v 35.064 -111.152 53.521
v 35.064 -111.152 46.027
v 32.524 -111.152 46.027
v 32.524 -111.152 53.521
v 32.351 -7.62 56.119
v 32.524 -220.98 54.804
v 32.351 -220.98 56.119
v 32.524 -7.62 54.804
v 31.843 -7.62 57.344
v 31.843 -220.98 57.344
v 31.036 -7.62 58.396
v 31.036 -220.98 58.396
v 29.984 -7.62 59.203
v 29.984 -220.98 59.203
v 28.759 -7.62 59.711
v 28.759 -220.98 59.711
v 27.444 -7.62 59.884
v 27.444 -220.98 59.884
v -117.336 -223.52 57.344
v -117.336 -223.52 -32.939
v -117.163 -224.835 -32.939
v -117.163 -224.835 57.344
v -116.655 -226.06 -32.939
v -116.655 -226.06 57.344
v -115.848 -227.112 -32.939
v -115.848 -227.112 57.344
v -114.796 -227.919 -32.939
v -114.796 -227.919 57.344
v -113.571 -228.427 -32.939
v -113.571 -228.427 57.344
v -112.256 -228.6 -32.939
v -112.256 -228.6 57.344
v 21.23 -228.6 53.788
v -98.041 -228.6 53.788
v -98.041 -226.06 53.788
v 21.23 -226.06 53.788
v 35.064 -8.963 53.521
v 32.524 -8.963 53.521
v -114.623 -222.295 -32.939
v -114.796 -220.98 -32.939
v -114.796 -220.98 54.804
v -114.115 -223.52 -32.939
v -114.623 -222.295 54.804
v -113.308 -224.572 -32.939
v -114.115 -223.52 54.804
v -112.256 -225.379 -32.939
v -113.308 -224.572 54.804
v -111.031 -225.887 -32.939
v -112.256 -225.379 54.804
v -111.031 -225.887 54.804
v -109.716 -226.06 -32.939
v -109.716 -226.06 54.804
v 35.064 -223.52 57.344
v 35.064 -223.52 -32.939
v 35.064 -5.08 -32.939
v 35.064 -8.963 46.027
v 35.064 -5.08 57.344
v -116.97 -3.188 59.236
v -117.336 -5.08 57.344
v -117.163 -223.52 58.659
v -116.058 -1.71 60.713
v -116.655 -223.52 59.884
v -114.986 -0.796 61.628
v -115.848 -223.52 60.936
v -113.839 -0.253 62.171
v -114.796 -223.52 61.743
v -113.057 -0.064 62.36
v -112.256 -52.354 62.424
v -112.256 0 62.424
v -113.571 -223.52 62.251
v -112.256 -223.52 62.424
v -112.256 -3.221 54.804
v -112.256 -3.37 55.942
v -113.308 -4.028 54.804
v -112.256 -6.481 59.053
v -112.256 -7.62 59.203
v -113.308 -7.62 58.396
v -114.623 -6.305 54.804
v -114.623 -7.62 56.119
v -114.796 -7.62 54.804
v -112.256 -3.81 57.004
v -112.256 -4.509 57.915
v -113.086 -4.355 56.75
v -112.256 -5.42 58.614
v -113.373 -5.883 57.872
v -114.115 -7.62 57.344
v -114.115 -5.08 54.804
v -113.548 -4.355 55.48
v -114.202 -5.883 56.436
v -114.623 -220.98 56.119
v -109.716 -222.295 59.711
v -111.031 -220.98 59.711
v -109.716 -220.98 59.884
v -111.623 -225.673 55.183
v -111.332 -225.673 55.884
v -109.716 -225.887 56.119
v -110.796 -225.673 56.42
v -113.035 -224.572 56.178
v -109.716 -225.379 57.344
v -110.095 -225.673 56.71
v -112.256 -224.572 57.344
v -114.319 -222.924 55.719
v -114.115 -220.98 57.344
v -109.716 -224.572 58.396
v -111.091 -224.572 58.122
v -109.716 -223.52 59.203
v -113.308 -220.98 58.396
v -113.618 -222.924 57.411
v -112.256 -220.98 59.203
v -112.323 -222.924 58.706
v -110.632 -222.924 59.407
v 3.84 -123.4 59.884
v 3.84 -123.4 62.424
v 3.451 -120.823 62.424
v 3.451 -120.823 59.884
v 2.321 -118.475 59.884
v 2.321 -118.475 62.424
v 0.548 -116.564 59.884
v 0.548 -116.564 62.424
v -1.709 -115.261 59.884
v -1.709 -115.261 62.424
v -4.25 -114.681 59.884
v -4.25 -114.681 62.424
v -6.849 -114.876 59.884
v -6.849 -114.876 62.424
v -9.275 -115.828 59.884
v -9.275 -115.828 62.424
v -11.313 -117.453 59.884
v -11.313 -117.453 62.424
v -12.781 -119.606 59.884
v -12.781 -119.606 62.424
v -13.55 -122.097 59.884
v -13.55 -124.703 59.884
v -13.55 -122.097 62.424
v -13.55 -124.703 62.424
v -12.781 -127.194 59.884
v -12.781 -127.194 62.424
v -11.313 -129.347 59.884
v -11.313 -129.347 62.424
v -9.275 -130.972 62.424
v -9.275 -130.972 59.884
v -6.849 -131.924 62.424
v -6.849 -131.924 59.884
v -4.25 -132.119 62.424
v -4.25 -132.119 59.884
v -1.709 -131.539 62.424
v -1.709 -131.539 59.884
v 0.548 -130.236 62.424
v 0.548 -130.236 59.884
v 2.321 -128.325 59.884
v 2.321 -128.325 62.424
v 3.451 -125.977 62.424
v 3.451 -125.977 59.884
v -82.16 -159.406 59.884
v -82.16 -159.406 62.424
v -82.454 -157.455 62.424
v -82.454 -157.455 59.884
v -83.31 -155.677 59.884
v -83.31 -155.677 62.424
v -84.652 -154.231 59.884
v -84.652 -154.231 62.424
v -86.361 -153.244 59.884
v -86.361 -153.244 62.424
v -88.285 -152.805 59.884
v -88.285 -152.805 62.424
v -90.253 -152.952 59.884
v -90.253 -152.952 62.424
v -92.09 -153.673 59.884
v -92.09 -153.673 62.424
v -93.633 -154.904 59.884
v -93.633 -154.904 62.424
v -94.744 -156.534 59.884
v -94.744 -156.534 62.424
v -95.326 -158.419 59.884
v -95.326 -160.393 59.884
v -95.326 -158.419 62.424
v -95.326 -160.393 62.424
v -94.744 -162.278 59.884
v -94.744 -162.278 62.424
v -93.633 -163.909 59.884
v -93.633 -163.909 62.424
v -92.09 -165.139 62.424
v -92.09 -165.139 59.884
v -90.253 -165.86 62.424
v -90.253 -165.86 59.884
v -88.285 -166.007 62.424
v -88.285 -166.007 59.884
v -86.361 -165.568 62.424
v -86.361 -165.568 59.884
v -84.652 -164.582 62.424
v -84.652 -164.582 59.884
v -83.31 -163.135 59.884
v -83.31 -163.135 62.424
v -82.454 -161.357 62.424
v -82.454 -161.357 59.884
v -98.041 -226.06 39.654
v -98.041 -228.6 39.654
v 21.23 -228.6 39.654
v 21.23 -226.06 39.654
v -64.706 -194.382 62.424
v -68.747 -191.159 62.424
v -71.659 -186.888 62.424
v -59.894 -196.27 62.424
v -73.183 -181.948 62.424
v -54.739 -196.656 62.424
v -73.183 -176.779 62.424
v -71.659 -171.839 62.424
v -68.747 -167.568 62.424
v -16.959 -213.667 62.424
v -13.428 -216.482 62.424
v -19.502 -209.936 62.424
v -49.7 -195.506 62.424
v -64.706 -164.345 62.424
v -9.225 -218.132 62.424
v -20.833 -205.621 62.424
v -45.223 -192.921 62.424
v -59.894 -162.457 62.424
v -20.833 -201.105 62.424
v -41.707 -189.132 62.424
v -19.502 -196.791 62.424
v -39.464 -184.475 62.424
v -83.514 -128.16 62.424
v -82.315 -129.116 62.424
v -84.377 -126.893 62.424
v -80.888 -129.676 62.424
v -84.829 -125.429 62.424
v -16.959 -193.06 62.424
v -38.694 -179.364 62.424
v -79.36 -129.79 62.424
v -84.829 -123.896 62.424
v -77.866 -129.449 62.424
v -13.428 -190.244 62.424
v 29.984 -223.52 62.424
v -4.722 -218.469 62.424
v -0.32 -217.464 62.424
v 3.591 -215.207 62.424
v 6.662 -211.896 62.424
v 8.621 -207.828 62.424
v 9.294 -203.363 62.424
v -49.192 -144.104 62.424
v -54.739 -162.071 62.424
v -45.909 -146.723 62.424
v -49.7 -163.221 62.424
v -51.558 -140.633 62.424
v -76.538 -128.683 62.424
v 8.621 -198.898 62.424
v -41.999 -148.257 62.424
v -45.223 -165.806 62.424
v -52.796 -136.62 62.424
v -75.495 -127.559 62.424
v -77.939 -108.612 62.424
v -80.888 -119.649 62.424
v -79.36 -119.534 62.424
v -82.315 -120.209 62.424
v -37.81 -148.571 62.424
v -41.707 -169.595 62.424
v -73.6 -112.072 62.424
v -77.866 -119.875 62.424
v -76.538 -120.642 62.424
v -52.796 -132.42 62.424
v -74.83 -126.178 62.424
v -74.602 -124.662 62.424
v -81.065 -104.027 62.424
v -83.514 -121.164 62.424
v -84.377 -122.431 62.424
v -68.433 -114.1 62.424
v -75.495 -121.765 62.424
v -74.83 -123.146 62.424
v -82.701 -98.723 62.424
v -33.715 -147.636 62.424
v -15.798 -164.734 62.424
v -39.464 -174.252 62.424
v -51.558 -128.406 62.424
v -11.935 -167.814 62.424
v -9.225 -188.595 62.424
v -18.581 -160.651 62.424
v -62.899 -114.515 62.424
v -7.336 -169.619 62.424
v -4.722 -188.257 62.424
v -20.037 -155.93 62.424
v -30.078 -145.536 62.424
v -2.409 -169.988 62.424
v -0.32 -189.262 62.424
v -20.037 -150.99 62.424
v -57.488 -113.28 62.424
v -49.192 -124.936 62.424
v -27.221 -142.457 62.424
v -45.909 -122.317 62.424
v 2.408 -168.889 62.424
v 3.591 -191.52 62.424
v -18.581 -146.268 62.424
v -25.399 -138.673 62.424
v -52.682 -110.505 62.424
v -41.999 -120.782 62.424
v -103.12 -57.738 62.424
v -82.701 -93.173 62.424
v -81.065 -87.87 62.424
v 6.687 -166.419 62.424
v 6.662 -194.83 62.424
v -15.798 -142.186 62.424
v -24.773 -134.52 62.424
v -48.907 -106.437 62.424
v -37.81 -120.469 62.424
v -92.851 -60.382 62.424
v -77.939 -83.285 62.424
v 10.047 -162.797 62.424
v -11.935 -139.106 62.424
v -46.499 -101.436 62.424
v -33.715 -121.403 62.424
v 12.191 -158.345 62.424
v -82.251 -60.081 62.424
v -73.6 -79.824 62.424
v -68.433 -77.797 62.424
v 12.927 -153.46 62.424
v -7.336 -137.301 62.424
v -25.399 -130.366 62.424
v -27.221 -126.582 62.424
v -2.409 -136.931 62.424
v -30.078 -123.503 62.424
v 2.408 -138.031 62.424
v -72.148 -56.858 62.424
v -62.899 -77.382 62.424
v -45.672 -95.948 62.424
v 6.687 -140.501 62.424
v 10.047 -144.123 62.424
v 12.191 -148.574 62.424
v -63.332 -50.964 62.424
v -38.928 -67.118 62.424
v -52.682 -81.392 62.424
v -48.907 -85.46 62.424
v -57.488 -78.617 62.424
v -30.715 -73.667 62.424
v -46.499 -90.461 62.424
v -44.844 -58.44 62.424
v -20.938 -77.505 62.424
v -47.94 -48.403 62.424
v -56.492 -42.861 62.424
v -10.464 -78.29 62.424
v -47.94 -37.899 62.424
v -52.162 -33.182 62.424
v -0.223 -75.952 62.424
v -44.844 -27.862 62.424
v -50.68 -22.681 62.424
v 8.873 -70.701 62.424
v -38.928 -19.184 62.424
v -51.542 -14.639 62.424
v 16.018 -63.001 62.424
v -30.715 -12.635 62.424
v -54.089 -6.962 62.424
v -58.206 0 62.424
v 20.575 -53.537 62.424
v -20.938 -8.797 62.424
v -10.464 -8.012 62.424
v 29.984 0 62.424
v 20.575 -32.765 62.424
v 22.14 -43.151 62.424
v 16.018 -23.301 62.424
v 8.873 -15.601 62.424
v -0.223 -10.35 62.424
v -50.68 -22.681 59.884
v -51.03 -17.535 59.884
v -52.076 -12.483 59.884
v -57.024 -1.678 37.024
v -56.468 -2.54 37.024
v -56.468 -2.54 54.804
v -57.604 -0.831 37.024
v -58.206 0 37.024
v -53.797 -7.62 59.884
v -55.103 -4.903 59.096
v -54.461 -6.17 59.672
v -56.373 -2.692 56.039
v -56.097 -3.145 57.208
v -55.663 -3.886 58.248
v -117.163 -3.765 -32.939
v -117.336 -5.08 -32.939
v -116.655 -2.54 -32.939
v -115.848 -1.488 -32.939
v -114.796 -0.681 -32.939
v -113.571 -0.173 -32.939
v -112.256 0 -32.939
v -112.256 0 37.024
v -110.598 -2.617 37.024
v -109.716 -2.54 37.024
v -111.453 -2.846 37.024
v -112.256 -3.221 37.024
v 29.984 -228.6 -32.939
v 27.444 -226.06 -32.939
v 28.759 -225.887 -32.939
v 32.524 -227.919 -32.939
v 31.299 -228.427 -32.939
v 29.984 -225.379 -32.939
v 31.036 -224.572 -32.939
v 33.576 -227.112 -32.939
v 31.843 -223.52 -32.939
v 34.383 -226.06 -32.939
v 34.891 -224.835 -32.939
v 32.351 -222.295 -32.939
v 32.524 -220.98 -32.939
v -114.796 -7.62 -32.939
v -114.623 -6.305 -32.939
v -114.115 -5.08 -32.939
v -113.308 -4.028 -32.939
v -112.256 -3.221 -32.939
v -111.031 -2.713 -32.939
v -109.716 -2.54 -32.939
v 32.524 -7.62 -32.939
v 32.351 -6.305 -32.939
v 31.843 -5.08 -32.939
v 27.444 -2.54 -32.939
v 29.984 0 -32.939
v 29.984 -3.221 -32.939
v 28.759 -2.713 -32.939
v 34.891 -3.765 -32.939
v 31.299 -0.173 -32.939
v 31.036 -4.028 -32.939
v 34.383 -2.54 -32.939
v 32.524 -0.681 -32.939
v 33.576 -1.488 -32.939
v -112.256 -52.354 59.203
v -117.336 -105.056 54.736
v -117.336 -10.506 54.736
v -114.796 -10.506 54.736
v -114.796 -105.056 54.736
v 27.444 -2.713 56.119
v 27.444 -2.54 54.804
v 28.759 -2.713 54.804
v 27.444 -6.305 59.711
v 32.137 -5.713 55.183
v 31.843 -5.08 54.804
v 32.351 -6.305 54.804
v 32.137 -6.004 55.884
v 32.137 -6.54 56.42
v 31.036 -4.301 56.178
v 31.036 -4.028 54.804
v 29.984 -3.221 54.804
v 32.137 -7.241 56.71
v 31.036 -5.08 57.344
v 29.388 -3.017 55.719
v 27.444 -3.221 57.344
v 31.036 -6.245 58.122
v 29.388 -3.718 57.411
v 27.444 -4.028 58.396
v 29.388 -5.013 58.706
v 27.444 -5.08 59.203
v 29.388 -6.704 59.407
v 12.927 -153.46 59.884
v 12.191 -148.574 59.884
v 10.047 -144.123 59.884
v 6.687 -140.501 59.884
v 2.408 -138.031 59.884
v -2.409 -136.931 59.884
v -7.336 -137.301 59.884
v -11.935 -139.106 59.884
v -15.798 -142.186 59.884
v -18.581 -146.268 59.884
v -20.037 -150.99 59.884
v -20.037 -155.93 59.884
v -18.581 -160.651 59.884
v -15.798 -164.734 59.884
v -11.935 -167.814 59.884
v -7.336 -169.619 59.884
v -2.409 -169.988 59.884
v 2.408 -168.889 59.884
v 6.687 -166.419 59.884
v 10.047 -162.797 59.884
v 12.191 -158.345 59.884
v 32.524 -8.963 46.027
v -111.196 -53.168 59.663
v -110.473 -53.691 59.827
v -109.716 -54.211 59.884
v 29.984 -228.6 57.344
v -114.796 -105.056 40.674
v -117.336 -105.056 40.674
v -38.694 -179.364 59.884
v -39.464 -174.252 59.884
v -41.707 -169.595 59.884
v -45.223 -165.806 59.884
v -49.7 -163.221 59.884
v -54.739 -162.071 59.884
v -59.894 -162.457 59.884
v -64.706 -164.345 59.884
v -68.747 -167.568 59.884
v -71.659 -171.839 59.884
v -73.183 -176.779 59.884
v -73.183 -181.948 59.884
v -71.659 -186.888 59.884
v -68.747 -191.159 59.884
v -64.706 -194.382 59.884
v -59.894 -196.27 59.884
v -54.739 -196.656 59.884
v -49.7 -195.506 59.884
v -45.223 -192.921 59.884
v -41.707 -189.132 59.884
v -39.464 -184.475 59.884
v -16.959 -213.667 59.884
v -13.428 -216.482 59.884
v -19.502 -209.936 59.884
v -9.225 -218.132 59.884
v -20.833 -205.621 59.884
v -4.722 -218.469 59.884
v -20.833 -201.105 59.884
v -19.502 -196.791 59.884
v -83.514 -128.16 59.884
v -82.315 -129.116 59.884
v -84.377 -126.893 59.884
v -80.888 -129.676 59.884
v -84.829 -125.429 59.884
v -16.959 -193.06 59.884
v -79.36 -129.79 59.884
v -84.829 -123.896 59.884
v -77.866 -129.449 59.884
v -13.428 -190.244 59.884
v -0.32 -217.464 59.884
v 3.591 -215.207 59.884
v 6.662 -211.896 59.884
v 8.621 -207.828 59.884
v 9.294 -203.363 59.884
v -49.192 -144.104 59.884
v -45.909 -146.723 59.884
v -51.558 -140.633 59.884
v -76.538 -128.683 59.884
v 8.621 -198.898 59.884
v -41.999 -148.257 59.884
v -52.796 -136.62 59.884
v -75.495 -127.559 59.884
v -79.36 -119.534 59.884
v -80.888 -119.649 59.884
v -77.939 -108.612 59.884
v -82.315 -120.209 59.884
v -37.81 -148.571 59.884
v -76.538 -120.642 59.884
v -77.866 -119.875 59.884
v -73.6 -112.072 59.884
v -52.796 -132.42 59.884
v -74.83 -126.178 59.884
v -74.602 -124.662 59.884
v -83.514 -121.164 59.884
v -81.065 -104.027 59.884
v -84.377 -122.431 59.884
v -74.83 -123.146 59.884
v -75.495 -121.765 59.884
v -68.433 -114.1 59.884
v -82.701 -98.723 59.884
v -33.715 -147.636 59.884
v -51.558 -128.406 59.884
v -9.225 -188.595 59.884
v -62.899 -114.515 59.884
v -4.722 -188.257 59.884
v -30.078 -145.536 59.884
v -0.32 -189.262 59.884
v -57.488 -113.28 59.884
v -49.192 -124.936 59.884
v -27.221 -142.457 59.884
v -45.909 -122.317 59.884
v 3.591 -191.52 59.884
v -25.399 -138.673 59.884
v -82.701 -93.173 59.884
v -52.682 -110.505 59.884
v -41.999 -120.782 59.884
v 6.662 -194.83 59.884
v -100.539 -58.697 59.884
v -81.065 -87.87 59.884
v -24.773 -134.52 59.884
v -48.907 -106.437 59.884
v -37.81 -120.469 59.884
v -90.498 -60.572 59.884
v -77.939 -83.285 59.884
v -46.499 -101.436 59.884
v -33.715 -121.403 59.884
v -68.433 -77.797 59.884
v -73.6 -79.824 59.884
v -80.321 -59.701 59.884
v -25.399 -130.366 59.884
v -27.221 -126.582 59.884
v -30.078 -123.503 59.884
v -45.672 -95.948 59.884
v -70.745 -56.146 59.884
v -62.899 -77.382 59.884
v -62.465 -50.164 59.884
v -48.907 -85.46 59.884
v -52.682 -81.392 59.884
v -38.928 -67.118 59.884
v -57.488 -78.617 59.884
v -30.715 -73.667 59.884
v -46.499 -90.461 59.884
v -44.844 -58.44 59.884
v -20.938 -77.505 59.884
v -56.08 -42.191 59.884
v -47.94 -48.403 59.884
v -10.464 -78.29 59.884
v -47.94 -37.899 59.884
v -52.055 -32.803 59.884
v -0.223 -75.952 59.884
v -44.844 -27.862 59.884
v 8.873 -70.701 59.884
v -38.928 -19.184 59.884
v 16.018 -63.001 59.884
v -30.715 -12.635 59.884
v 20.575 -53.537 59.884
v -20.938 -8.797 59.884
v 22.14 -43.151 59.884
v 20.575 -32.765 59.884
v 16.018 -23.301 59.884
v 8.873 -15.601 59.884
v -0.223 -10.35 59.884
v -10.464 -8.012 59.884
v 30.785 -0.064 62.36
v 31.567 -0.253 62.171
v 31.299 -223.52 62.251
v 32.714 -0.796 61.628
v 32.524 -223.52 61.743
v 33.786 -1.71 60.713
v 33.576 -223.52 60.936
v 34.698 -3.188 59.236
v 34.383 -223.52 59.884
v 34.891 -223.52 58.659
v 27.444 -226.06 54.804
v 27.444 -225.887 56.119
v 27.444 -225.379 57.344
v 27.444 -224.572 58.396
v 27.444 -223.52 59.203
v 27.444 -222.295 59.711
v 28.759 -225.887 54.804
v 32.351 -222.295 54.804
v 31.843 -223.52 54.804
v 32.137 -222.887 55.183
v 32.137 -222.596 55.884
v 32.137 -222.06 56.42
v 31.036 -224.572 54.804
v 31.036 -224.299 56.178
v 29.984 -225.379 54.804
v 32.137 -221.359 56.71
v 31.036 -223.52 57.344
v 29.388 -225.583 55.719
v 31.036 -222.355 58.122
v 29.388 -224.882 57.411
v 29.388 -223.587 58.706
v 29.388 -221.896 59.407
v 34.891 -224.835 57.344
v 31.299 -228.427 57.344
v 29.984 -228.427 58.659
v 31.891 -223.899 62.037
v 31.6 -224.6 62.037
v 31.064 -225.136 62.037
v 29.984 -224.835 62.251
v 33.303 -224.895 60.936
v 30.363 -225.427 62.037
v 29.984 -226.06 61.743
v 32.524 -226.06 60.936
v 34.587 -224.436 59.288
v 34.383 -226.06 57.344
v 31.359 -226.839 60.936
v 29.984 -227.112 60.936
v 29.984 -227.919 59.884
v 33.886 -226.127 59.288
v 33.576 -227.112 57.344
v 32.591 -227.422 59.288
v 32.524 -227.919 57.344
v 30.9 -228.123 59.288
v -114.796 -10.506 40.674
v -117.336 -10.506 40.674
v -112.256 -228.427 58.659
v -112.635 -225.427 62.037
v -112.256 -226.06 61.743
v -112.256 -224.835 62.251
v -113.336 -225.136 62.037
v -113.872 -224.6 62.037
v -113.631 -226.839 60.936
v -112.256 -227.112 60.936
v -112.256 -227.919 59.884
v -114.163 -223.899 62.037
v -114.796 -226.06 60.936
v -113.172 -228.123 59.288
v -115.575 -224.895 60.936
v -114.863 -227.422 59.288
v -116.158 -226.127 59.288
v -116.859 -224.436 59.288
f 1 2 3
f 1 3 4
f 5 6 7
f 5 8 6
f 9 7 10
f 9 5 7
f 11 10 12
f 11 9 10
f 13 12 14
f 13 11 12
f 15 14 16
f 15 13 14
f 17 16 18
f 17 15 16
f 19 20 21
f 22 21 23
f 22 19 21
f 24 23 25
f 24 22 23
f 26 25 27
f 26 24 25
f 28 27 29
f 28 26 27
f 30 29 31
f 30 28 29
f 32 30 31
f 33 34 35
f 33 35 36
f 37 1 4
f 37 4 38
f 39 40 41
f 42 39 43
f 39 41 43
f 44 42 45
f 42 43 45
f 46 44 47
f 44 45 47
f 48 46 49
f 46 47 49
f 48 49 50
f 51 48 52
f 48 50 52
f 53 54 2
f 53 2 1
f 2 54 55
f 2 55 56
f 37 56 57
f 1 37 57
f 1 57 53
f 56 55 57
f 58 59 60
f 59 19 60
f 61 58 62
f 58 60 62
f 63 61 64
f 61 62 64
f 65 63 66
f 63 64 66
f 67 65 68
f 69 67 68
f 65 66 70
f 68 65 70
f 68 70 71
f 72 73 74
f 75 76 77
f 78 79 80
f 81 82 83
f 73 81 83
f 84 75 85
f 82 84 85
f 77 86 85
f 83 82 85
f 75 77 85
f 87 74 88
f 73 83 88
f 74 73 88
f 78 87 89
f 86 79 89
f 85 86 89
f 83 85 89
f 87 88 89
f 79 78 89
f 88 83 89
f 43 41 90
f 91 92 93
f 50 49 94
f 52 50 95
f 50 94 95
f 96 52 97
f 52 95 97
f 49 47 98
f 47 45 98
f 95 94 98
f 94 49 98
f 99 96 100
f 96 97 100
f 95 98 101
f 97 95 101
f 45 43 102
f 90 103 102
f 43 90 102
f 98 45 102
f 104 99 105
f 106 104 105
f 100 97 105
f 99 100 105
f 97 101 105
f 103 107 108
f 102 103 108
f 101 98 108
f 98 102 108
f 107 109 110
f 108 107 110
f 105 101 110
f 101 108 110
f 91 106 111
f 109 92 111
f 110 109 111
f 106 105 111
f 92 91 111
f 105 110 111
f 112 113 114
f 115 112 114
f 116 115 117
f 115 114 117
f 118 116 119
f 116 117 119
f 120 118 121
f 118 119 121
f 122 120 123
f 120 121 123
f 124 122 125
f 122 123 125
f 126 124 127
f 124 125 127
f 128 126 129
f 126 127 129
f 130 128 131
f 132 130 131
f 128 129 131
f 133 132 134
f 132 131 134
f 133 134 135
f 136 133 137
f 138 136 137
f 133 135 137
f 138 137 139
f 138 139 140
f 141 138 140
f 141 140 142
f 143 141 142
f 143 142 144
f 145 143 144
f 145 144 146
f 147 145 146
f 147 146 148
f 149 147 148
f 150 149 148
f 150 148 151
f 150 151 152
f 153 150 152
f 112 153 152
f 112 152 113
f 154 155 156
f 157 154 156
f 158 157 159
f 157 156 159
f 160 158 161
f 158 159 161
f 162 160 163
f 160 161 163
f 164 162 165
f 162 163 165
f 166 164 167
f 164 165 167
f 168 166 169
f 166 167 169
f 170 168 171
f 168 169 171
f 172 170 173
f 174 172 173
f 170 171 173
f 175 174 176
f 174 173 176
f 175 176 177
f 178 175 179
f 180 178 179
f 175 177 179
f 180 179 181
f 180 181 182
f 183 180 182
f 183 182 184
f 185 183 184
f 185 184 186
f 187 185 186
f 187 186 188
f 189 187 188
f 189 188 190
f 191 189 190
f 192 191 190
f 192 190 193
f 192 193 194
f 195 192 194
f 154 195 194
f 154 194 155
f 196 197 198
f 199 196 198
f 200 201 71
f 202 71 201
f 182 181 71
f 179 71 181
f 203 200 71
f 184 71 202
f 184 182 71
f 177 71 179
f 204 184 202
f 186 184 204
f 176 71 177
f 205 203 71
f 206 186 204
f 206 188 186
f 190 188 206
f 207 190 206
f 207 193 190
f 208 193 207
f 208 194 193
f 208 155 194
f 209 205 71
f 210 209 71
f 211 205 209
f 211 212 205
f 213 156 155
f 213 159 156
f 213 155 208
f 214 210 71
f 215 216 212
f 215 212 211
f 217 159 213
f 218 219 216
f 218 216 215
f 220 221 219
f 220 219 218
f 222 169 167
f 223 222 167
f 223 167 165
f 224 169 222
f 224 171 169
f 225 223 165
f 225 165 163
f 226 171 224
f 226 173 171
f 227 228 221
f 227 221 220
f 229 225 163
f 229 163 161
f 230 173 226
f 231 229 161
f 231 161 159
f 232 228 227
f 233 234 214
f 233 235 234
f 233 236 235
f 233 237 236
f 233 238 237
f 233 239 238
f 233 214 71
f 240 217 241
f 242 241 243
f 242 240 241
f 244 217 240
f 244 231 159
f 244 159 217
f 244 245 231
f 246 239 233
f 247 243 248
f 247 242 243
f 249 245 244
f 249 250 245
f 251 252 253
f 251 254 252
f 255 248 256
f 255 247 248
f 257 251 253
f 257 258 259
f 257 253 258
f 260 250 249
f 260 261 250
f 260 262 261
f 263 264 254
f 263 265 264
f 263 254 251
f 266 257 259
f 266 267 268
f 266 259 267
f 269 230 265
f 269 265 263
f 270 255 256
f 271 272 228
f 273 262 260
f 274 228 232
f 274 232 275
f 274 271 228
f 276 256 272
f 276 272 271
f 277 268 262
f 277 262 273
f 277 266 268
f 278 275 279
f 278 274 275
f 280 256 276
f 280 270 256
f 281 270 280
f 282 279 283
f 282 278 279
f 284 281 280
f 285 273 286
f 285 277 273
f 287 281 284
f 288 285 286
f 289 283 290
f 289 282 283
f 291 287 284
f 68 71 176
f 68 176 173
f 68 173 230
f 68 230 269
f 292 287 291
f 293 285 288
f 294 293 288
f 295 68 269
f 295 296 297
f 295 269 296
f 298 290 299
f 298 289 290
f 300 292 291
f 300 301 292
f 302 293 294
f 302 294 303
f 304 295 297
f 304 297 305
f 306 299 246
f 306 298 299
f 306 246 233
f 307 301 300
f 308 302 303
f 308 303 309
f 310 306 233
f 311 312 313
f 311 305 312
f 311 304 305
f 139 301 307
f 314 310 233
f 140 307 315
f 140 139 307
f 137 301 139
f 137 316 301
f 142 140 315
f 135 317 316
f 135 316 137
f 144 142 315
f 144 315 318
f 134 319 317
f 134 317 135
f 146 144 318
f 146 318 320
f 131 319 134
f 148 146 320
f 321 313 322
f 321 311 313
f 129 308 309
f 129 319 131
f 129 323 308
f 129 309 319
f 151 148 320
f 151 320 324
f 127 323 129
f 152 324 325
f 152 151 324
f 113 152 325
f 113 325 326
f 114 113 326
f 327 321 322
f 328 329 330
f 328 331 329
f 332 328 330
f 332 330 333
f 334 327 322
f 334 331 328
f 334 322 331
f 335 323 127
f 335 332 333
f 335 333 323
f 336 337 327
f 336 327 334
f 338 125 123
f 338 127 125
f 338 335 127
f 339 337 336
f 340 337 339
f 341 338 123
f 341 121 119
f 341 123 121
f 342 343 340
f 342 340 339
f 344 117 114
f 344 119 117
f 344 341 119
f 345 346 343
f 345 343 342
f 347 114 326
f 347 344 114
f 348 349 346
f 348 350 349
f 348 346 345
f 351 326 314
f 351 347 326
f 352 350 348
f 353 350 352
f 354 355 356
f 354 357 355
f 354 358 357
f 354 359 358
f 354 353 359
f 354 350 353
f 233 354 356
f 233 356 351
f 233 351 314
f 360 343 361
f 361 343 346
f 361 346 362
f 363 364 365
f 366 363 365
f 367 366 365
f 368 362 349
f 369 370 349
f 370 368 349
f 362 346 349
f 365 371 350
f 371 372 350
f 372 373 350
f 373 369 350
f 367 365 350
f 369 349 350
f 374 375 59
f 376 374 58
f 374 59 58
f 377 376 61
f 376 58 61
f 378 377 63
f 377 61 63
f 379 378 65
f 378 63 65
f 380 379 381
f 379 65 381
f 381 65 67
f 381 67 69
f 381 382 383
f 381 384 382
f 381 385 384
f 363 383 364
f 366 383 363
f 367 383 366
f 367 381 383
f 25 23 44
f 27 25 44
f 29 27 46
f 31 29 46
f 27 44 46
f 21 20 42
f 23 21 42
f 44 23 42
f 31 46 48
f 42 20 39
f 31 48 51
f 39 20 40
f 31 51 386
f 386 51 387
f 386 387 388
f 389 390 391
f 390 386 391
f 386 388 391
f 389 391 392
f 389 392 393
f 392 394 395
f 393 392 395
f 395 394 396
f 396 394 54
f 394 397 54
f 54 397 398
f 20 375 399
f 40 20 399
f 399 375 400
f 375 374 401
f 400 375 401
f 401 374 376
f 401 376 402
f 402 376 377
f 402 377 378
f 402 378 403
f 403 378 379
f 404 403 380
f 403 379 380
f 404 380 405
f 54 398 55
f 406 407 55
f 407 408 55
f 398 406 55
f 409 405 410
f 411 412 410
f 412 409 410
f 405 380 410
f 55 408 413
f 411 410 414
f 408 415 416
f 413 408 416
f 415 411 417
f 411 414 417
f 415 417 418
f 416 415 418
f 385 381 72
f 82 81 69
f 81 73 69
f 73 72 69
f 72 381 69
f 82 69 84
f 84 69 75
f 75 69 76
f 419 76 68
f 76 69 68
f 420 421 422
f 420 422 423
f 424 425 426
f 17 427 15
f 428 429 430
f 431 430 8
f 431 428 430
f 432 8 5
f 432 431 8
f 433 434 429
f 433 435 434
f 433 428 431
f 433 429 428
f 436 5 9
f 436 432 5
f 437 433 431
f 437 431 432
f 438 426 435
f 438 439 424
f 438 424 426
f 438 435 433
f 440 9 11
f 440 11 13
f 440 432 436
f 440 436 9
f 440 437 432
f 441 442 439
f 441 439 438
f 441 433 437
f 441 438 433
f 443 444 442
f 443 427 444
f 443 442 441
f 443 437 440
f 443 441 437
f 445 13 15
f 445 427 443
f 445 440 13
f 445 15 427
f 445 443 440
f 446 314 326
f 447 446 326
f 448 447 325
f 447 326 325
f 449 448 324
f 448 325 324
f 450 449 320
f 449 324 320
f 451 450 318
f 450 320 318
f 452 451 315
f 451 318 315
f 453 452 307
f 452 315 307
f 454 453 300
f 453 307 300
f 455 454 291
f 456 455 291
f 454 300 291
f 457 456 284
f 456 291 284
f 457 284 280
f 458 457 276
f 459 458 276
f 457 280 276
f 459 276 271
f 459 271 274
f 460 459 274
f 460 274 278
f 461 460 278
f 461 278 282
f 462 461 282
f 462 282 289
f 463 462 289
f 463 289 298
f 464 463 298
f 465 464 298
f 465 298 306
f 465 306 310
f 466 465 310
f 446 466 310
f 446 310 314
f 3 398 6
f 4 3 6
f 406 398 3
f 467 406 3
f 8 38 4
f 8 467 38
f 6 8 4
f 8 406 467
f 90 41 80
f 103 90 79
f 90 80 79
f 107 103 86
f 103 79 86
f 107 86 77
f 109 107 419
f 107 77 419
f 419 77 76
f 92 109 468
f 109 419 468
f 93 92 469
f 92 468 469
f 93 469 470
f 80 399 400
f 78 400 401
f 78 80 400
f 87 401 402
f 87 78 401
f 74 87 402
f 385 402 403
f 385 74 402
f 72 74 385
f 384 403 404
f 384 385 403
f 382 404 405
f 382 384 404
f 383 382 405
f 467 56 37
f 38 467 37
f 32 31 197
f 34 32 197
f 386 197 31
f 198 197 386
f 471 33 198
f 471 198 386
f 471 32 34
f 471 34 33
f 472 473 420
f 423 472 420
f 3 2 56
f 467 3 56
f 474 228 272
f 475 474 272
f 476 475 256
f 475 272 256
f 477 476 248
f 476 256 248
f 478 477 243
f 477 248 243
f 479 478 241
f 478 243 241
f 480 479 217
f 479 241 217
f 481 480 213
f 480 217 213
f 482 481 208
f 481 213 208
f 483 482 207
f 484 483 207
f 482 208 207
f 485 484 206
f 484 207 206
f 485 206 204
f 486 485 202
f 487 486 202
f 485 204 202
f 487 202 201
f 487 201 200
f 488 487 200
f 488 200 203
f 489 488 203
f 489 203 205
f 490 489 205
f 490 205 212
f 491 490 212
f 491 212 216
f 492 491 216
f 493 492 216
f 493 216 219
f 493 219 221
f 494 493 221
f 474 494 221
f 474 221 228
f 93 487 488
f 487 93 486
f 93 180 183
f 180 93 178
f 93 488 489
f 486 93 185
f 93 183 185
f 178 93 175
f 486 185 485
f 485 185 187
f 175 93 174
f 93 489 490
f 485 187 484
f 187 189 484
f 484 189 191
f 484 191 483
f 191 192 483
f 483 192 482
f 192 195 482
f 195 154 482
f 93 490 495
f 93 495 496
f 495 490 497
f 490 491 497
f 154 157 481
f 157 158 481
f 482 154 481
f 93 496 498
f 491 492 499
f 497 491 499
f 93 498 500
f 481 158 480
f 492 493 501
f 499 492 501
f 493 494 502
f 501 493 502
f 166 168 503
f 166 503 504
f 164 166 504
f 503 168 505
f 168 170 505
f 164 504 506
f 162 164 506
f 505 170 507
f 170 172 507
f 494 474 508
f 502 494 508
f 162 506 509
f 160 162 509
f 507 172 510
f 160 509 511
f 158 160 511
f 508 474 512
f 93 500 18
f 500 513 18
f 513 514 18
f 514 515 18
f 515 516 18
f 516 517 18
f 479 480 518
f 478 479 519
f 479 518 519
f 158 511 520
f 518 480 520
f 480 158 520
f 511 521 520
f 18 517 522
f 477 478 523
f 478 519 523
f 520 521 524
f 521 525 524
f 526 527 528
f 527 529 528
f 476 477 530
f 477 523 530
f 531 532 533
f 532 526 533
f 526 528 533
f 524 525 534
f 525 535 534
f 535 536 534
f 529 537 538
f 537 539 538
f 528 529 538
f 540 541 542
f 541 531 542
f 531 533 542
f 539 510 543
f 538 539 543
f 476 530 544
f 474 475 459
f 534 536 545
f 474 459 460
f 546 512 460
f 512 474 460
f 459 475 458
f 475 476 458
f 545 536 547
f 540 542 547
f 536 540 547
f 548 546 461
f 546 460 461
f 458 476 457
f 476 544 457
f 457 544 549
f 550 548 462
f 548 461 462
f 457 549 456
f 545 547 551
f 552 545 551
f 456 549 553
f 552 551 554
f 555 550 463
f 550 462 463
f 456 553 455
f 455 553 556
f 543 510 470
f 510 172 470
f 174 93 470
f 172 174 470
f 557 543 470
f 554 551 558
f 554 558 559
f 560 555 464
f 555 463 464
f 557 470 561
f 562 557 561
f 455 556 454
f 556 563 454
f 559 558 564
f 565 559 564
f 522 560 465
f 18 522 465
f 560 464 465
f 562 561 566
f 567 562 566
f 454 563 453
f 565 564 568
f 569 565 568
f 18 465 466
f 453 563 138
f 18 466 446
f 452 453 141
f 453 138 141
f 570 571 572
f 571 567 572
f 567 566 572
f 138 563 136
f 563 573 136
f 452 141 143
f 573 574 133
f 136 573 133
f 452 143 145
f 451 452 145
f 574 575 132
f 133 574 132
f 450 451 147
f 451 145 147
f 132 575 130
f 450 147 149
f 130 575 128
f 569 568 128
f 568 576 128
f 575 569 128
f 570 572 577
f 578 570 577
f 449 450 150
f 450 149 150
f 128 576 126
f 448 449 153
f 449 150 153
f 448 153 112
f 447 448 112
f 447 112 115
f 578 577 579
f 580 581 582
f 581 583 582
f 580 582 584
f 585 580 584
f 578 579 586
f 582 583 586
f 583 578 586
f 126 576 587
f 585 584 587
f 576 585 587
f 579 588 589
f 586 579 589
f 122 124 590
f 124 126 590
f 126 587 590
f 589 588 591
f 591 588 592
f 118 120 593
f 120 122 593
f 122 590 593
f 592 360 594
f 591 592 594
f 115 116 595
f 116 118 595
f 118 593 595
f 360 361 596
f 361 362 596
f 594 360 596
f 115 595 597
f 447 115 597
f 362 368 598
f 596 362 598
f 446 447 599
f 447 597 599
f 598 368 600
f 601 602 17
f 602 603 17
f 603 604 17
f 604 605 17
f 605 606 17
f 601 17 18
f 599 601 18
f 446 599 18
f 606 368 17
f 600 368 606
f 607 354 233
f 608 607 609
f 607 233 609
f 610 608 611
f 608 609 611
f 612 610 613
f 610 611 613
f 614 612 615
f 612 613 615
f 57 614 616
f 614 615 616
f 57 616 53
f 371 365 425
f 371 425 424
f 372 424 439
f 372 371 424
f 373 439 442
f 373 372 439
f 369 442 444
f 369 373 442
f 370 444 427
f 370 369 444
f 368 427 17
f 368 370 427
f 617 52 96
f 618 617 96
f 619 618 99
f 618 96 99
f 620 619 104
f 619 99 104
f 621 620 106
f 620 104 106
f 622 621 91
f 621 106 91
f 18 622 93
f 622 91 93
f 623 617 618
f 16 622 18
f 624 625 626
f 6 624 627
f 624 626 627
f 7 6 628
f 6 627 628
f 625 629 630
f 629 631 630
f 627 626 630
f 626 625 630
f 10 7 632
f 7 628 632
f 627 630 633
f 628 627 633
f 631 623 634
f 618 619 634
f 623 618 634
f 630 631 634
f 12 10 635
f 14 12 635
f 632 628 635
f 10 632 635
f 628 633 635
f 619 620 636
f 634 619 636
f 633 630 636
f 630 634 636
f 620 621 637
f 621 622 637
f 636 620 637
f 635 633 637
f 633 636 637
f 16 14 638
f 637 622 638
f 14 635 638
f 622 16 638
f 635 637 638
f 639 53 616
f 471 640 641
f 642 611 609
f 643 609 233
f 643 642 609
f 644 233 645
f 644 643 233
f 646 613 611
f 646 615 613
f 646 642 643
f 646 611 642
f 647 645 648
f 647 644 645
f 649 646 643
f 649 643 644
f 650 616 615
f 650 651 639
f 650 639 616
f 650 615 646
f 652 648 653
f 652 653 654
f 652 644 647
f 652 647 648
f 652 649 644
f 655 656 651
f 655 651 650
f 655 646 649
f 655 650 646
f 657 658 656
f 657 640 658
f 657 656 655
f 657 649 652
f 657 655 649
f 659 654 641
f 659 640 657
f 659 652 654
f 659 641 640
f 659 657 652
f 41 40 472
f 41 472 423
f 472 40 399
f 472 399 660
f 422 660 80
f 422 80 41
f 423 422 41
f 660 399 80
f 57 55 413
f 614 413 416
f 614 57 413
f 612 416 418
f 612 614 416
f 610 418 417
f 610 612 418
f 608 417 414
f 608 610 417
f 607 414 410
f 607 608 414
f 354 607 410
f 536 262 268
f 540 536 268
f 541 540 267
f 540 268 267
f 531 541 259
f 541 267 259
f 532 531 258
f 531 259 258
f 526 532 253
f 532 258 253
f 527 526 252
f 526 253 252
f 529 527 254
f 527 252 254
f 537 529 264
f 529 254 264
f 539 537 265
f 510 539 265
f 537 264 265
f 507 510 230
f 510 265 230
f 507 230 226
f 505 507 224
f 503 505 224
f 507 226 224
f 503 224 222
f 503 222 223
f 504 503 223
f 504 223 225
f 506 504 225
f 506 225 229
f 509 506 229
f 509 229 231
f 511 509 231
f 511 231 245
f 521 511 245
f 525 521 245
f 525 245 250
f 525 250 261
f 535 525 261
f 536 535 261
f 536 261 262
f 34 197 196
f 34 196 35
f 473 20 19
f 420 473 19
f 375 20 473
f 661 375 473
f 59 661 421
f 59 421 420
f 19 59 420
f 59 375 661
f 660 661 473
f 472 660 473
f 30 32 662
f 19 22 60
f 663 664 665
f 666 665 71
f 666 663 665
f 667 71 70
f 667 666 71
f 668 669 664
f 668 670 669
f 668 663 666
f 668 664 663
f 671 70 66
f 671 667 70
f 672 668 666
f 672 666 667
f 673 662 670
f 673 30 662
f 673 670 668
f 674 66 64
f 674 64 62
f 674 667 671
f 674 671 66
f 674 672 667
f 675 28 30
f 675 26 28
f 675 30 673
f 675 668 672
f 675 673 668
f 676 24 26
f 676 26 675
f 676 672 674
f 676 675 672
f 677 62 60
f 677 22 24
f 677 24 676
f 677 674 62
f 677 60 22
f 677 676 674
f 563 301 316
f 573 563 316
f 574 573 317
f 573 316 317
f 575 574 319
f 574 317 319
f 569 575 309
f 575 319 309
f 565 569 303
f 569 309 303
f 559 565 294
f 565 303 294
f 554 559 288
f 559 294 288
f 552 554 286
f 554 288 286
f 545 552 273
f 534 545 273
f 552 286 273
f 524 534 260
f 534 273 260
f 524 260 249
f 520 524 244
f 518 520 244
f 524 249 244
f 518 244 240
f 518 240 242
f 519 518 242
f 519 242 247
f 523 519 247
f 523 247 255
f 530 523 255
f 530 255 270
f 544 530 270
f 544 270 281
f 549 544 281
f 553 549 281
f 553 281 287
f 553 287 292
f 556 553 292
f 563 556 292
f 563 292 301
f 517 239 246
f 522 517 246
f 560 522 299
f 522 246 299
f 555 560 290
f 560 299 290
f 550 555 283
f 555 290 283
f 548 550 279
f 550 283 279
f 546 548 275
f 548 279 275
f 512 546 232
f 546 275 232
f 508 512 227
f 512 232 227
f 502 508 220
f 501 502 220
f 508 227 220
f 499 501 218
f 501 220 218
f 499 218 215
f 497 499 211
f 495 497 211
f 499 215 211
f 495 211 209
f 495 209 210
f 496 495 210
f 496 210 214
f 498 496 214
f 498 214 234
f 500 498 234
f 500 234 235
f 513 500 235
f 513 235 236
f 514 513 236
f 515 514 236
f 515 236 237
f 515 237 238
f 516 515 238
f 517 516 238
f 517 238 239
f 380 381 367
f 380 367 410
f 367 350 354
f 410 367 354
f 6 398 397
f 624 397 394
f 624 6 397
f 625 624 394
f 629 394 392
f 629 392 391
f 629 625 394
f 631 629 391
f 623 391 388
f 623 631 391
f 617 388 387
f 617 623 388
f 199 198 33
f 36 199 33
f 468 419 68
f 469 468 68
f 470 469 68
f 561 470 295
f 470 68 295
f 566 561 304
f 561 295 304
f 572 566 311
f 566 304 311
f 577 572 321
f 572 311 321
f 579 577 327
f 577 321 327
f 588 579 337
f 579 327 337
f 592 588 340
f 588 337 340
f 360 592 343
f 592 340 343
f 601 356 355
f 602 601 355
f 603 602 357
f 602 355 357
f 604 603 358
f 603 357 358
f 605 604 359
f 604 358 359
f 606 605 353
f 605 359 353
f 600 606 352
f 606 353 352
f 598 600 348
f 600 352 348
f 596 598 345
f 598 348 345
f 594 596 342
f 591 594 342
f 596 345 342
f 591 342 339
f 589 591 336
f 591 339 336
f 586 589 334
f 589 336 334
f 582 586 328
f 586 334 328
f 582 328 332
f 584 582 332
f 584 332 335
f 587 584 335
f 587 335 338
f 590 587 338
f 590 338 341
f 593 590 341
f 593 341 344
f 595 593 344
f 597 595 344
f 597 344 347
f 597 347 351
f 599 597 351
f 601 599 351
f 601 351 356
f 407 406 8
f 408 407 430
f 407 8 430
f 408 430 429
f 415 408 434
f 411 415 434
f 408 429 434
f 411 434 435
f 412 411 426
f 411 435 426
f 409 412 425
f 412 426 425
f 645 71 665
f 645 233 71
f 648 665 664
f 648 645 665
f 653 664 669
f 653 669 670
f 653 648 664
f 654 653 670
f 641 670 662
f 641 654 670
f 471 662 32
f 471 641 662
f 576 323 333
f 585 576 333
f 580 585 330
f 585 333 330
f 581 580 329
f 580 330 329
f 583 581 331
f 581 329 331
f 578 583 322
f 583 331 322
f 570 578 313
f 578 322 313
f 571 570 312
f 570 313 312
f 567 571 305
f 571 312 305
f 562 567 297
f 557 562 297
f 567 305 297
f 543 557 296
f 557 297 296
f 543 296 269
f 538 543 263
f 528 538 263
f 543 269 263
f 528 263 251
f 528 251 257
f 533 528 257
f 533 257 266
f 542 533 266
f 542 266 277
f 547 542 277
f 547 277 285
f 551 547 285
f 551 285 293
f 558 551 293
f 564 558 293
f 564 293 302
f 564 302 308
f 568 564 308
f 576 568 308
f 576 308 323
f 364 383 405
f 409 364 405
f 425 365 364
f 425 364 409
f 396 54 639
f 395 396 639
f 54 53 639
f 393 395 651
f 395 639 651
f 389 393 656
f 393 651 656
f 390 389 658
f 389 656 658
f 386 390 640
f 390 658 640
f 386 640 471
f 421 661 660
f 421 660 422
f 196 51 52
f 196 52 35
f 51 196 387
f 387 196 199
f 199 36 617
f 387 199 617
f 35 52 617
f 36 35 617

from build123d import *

# Parameters (mm, degrees)
F0_W      = 152.4
F0_H      = 95.3626578227
F1_DEPTH  = 228.6
F2_T      = -2.54
F3_R      = 5.08
F4_R      = 35.2372499074
F5_DEPTH  = 25.4
F6_R      = 18.618406975
F6_R_2    = 16.5748786225
F6_R_3    = 8.7435651561
F6_R_4    = 17.3413047292
F7_DEPTH  = 25.4
F8_R      = 5.1423481667
F8_R_2    = 14.090646871
F8_R_3    = 6.6197884321
F8_R_4    = 15.148279019
F9_DEPTH  = 25.4
F10_W     = 119.2719545215
F10_H     = 14.1333565116
F11_DEPTH = 25.4
F12_W     = 94.5496149361
F12_H     = 14.0616036952
F13_DEPTH = 25.4
F14_W     = 102.1888470277
F14_H     = 7.4939653277
F15_DEPTH = 25.4


with BuildPart() as f1:
    # F0 (on Front) → F1 (new body)
    with BuildSketch(Plane.XZ):
        with Locations((-41.1360282451, 14.7424824536)):
            Rectangle(F0_W, F0_H)
    extrude(amount=F1_DEPTH)

    # F2
    f2_openings = [f1.faces().sort_by_distance(p)[0] for p in [
        (-41.136028, -114.3, -32.938846),
    ]]
    offset(amount=F2_T, openings=f2_openings)

    # F3
    f3_edges = [f1.edges().sort_by_distance(p)[0] for p in [
        (-114.796028, -114.3, 59.883811),
        (-114.796028, -226.06, 13.472482),
        (-41.136028, -226.06, 59.883811),
        (32.523972, -226.06, 13.472482),
        (-41.136028, -2.54, 59.883811),
        (-114.796028, -2.54, 13.472482),
        (35.063972, 0, 14.742482),
        (-117.336028, 0, 14.742482),
        (-117.336028, -228.6, 14.742482),
        (35.063972, -228.6, 14.742482),
        (32.523972, -2.54, 13.472482),
        (35.063972, -114.3, 62.423811),
        (-41.136028, -228.6, 62.423811),
        (-117.336028, -114.3, 62.423811),
        (32.523972, -114.3, 59.883811),
    ]]
    fillet(f3_edges, radius=F3_R)

    # F4 (on face) → F5 (cut)
    with BuildSketch(Plane.XY.offset(62.423811365)):
        with Locations((-13.0968187004, -43.1509837508)):
            Circle(F4_R)
    extrude(amount=-F5_DEPTH, mode=Mode.SUBTRACT)

    # F6 (on face) → F7 (cut)
    with BuildSketch(Plane.XY.offset(62.423811365)):
        with BuildLine():
            ThreePointArc((-112.2560282451, -52.3542664582), (-72.1481054557, -56.8578320674), (-50.6796549672, -22.681331262))
            ThreePointArc((-50.6796549672, -22.681331262), (-52.6104743381, -10.7325381795), (-58.2063964066, 0))
            Line((-58.2063964066, 0), (-112.2560282451, 0))
            Line((-112.2560282451, 0), (-112.2560282451, -52.3542664582))
        make_face()
        with Locations((-64.2905011773, -95.9484130144)):
            Circle(F6_R)
        with Locations((-3.6475341767, -153.4599065781)):
            Circle(F6_R_2)
        with Locations((-4.9036405981, -123.4000101686)):
            Circle(F6_R_3)
        with Locations((-56.035131216, -179.3635040522)):
            Circle(F6_R_4)
    extrude(amount=-F7_DEPTH, mode=Mode.SUBTRACT)

    # F8 (on face) → F9 (cut)
    with BuildSketch(Plane.XY.offset(62.423811365)):
        with Locations((-79.7442123294, -124.662168324)):
            Circle(F8_R)
        with Locations((-38.8632304966, -134.5197707415)):
            Circle(F8_R_2)
        with Locations((-88.7798666954, -159.4061106443)):
            Circle(F8_R_3)
        with Locations((-5.8542490005, -203.3631652594)):
            Circle(F8_R_4)
    extrude(amount=-F9_DEPTH, mode=Mode.SUBTRACT)

    # F10 (on face) → F11 (cut)
    with BuildSketch(Plane.XZ.offset(228.6)):
        with Locations((-38.4055124596, 46.7209592462)):
            Rectangle(F10_W, F10_H)
    extrude(amount=-F11_DEPTH, mode=Mode.SUBTRACT)

    # F12 (on face) → F13 (cut)
    with BuildSketch(Plane(origin=(-117.3360282451, 0, 0), x_dir=(0, -1, 0), z_dir=(-1, 0, 0))):
        with Locations((57.7809717506, 47.705097124)):
            Rectangle(F12_W, F12_H)
    extrude(amount=-F13_DEPTH, mode=Mode.SUBTRACT)

    # F14 (on face) → F15 (cut)
    with BuildSketch(Plane.YZ.offset(35.0639717549)):
        with Locations((-60.0578528829, 49.7737638652)):
            Rectangle(F14_W, F14_H)
    extrude(amount=-F15_DEPTH, mode=Mode.SUBTRACT)


solid = f1.part
